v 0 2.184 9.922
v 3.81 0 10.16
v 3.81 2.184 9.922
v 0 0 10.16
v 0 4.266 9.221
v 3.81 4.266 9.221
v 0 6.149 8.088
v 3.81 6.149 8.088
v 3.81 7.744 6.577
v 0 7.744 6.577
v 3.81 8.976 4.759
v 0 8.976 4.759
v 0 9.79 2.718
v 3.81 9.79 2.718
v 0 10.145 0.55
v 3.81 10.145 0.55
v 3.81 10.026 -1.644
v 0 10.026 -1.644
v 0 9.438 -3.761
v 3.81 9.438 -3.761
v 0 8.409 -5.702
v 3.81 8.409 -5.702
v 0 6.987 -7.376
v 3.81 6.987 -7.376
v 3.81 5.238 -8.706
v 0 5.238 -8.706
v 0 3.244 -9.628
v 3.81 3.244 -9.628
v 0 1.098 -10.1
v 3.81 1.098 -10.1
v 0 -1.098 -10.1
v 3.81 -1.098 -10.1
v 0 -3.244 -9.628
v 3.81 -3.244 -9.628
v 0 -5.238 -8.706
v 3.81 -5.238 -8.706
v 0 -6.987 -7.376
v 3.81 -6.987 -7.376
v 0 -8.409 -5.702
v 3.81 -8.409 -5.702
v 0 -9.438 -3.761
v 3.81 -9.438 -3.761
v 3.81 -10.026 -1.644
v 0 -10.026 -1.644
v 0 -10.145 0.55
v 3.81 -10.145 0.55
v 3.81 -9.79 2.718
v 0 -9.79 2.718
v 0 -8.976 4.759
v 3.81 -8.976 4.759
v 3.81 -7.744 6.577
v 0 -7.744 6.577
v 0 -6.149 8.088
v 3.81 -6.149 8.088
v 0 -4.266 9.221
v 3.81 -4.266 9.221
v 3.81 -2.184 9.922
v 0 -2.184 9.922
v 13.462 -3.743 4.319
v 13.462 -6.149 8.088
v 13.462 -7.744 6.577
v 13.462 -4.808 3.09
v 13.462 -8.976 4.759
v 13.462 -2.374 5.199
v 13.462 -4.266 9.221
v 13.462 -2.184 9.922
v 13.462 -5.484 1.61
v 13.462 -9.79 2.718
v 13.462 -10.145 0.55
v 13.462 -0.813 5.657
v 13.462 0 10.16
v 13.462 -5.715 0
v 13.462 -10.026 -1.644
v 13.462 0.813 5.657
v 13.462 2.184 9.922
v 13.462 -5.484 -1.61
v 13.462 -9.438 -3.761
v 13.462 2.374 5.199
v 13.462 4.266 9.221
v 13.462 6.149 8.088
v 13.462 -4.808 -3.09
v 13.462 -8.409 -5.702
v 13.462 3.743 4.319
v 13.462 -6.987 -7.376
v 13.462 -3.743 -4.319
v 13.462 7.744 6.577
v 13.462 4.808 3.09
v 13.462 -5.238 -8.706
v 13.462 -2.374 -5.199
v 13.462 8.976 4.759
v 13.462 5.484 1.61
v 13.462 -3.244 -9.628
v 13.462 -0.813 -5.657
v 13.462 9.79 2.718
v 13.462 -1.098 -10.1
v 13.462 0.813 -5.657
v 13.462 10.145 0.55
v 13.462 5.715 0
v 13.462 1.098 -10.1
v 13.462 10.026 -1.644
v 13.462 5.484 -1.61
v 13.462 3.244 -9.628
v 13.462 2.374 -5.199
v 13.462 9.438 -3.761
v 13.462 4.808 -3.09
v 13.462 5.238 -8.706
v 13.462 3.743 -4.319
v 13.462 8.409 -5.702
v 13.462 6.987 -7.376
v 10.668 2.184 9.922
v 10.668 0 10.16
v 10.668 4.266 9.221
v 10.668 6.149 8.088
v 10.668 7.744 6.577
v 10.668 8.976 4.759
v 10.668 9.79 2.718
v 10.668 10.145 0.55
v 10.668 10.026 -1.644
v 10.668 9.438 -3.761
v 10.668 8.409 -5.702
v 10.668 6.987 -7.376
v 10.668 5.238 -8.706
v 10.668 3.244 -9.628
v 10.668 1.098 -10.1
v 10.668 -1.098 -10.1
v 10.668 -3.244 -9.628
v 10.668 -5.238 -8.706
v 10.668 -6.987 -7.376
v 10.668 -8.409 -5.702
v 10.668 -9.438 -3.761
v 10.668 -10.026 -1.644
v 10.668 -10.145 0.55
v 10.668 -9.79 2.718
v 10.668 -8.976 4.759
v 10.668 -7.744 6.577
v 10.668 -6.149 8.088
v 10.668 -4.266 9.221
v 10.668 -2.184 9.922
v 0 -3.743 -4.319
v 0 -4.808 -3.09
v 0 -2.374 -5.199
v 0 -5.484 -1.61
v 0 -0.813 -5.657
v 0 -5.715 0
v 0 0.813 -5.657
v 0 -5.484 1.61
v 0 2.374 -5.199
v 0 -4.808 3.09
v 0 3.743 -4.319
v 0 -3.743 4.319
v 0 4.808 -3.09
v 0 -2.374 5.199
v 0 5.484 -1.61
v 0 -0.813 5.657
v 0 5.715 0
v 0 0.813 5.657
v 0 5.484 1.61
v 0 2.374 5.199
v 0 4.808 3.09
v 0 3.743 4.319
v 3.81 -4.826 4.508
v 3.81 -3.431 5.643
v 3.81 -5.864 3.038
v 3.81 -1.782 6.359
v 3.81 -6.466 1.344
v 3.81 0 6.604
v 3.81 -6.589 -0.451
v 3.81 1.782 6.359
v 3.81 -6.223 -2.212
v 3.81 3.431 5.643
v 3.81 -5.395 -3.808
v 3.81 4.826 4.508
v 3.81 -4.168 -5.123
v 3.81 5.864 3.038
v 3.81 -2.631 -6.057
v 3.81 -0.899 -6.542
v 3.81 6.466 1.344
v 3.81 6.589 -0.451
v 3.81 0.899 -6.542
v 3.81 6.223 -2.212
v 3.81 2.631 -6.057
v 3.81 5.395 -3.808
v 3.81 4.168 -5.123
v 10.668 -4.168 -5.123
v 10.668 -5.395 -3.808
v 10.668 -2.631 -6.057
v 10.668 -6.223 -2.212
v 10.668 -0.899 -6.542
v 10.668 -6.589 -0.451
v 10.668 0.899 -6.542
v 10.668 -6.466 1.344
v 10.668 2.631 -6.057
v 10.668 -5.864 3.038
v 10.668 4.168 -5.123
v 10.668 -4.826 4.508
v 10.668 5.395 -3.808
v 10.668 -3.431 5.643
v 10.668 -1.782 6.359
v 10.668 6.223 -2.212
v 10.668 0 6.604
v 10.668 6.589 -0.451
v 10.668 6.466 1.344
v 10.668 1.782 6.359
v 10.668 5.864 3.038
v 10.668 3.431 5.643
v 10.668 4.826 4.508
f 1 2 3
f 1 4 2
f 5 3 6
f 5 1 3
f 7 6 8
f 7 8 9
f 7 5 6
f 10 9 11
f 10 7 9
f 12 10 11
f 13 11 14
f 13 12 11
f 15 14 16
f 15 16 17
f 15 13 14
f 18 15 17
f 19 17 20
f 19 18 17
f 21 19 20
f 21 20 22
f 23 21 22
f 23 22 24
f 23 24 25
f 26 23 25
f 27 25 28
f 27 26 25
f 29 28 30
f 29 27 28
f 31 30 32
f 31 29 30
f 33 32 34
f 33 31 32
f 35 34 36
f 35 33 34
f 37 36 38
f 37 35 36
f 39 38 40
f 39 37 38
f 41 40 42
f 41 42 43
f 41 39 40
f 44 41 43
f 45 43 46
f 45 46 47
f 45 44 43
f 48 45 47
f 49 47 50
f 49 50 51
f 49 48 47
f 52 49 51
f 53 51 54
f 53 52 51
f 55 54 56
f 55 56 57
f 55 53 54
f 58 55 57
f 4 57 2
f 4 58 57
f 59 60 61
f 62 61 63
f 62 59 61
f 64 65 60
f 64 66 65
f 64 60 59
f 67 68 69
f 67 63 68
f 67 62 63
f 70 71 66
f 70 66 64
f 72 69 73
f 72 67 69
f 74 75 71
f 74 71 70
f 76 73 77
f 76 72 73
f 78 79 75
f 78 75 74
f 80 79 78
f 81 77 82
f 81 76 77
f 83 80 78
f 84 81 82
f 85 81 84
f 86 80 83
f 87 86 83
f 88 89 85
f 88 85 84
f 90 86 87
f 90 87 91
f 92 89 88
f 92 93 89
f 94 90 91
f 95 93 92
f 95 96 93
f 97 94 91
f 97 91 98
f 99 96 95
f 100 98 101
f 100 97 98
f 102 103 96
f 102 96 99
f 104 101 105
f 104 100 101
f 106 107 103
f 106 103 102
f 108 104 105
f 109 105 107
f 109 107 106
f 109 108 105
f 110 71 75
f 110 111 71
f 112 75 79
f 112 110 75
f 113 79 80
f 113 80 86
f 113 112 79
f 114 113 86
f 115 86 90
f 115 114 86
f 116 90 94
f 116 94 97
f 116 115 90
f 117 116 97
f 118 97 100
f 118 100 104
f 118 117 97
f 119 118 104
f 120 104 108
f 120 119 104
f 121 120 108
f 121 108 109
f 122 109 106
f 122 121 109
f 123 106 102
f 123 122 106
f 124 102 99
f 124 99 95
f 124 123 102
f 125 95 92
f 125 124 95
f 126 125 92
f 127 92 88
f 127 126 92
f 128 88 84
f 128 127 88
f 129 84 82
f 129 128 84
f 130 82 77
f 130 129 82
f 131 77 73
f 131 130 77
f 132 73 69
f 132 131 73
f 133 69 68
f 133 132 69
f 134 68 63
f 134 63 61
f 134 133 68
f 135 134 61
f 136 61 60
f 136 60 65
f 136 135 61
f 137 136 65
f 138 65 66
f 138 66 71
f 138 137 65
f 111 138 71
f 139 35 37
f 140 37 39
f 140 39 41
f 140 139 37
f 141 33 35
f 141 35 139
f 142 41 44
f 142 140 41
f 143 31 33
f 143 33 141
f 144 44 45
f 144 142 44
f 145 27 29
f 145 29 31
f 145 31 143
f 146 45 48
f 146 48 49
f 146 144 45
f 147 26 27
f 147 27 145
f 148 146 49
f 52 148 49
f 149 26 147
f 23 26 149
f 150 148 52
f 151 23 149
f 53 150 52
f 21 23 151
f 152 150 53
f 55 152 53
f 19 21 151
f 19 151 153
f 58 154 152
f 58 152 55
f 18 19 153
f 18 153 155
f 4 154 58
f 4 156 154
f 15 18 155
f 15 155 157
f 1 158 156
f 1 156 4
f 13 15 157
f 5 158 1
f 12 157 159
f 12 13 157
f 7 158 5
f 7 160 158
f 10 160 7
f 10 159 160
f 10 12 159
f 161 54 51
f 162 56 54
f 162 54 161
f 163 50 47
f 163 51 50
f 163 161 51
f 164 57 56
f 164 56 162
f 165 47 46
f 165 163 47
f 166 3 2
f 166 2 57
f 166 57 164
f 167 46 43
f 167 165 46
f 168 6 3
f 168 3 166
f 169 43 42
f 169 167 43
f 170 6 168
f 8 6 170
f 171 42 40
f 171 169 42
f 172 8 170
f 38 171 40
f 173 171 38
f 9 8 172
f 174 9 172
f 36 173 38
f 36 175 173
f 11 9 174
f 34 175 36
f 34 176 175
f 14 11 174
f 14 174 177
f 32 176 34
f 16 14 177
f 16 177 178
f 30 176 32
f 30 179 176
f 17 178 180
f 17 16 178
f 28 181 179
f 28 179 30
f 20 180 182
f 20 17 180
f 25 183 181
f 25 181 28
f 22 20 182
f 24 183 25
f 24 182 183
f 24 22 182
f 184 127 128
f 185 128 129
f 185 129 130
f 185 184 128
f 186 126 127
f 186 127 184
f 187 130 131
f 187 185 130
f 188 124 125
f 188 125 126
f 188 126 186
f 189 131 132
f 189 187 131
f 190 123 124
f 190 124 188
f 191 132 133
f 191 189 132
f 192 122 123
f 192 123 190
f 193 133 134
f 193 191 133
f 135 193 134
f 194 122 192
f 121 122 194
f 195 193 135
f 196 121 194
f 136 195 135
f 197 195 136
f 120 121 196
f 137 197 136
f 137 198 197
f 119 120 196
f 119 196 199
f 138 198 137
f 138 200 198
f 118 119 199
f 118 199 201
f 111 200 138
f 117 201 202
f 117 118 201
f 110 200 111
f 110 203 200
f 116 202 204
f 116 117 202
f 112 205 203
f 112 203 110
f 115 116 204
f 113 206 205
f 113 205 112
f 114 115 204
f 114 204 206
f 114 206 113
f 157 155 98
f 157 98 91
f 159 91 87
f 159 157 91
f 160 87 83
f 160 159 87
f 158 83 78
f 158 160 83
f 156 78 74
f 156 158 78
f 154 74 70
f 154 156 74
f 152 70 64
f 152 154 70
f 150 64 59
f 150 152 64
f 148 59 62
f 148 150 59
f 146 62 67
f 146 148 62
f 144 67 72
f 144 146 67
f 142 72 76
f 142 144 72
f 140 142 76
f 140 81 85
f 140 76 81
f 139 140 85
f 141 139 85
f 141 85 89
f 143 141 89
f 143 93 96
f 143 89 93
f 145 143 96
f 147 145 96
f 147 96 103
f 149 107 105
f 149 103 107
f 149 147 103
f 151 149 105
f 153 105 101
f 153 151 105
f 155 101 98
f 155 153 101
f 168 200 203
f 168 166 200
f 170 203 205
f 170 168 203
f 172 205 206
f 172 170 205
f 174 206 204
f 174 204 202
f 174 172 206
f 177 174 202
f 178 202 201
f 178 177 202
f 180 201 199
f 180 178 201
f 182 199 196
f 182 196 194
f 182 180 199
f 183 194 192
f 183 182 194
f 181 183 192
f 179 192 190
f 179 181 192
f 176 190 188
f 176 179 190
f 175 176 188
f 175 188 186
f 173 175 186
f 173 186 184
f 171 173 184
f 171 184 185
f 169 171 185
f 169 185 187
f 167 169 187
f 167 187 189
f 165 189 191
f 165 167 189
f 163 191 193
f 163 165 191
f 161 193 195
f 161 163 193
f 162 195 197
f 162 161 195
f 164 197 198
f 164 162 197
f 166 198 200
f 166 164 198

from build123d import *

# Parameters (mm, degrees)
F2_R     = 5.715
F3_DEPTH = 13.463


with BuildPart() as f1:
    # F0 (on Front) → F1 (revolve)
    with BuildSketch(Plane.XZ):
        Polygon((0, 10.16), (0, 0), (13.462, 0), (13.462, 10.16), (10.668, 10.16), (10.668, 6.604), (3.81, 6.604), (3.81, 10.16), align=None)
    revolve(axis=Axis((6.731, 0, 0), (-1, 0, 0)))

    # F2 (on Right) → F3 (cut, through all)
    with BuildSketch(Plane.YZ):
        Circle(F2_R)
    extrude(amount=F3_DEPTH, mode=Mode.SUBTRACT)


solid = f1.part
